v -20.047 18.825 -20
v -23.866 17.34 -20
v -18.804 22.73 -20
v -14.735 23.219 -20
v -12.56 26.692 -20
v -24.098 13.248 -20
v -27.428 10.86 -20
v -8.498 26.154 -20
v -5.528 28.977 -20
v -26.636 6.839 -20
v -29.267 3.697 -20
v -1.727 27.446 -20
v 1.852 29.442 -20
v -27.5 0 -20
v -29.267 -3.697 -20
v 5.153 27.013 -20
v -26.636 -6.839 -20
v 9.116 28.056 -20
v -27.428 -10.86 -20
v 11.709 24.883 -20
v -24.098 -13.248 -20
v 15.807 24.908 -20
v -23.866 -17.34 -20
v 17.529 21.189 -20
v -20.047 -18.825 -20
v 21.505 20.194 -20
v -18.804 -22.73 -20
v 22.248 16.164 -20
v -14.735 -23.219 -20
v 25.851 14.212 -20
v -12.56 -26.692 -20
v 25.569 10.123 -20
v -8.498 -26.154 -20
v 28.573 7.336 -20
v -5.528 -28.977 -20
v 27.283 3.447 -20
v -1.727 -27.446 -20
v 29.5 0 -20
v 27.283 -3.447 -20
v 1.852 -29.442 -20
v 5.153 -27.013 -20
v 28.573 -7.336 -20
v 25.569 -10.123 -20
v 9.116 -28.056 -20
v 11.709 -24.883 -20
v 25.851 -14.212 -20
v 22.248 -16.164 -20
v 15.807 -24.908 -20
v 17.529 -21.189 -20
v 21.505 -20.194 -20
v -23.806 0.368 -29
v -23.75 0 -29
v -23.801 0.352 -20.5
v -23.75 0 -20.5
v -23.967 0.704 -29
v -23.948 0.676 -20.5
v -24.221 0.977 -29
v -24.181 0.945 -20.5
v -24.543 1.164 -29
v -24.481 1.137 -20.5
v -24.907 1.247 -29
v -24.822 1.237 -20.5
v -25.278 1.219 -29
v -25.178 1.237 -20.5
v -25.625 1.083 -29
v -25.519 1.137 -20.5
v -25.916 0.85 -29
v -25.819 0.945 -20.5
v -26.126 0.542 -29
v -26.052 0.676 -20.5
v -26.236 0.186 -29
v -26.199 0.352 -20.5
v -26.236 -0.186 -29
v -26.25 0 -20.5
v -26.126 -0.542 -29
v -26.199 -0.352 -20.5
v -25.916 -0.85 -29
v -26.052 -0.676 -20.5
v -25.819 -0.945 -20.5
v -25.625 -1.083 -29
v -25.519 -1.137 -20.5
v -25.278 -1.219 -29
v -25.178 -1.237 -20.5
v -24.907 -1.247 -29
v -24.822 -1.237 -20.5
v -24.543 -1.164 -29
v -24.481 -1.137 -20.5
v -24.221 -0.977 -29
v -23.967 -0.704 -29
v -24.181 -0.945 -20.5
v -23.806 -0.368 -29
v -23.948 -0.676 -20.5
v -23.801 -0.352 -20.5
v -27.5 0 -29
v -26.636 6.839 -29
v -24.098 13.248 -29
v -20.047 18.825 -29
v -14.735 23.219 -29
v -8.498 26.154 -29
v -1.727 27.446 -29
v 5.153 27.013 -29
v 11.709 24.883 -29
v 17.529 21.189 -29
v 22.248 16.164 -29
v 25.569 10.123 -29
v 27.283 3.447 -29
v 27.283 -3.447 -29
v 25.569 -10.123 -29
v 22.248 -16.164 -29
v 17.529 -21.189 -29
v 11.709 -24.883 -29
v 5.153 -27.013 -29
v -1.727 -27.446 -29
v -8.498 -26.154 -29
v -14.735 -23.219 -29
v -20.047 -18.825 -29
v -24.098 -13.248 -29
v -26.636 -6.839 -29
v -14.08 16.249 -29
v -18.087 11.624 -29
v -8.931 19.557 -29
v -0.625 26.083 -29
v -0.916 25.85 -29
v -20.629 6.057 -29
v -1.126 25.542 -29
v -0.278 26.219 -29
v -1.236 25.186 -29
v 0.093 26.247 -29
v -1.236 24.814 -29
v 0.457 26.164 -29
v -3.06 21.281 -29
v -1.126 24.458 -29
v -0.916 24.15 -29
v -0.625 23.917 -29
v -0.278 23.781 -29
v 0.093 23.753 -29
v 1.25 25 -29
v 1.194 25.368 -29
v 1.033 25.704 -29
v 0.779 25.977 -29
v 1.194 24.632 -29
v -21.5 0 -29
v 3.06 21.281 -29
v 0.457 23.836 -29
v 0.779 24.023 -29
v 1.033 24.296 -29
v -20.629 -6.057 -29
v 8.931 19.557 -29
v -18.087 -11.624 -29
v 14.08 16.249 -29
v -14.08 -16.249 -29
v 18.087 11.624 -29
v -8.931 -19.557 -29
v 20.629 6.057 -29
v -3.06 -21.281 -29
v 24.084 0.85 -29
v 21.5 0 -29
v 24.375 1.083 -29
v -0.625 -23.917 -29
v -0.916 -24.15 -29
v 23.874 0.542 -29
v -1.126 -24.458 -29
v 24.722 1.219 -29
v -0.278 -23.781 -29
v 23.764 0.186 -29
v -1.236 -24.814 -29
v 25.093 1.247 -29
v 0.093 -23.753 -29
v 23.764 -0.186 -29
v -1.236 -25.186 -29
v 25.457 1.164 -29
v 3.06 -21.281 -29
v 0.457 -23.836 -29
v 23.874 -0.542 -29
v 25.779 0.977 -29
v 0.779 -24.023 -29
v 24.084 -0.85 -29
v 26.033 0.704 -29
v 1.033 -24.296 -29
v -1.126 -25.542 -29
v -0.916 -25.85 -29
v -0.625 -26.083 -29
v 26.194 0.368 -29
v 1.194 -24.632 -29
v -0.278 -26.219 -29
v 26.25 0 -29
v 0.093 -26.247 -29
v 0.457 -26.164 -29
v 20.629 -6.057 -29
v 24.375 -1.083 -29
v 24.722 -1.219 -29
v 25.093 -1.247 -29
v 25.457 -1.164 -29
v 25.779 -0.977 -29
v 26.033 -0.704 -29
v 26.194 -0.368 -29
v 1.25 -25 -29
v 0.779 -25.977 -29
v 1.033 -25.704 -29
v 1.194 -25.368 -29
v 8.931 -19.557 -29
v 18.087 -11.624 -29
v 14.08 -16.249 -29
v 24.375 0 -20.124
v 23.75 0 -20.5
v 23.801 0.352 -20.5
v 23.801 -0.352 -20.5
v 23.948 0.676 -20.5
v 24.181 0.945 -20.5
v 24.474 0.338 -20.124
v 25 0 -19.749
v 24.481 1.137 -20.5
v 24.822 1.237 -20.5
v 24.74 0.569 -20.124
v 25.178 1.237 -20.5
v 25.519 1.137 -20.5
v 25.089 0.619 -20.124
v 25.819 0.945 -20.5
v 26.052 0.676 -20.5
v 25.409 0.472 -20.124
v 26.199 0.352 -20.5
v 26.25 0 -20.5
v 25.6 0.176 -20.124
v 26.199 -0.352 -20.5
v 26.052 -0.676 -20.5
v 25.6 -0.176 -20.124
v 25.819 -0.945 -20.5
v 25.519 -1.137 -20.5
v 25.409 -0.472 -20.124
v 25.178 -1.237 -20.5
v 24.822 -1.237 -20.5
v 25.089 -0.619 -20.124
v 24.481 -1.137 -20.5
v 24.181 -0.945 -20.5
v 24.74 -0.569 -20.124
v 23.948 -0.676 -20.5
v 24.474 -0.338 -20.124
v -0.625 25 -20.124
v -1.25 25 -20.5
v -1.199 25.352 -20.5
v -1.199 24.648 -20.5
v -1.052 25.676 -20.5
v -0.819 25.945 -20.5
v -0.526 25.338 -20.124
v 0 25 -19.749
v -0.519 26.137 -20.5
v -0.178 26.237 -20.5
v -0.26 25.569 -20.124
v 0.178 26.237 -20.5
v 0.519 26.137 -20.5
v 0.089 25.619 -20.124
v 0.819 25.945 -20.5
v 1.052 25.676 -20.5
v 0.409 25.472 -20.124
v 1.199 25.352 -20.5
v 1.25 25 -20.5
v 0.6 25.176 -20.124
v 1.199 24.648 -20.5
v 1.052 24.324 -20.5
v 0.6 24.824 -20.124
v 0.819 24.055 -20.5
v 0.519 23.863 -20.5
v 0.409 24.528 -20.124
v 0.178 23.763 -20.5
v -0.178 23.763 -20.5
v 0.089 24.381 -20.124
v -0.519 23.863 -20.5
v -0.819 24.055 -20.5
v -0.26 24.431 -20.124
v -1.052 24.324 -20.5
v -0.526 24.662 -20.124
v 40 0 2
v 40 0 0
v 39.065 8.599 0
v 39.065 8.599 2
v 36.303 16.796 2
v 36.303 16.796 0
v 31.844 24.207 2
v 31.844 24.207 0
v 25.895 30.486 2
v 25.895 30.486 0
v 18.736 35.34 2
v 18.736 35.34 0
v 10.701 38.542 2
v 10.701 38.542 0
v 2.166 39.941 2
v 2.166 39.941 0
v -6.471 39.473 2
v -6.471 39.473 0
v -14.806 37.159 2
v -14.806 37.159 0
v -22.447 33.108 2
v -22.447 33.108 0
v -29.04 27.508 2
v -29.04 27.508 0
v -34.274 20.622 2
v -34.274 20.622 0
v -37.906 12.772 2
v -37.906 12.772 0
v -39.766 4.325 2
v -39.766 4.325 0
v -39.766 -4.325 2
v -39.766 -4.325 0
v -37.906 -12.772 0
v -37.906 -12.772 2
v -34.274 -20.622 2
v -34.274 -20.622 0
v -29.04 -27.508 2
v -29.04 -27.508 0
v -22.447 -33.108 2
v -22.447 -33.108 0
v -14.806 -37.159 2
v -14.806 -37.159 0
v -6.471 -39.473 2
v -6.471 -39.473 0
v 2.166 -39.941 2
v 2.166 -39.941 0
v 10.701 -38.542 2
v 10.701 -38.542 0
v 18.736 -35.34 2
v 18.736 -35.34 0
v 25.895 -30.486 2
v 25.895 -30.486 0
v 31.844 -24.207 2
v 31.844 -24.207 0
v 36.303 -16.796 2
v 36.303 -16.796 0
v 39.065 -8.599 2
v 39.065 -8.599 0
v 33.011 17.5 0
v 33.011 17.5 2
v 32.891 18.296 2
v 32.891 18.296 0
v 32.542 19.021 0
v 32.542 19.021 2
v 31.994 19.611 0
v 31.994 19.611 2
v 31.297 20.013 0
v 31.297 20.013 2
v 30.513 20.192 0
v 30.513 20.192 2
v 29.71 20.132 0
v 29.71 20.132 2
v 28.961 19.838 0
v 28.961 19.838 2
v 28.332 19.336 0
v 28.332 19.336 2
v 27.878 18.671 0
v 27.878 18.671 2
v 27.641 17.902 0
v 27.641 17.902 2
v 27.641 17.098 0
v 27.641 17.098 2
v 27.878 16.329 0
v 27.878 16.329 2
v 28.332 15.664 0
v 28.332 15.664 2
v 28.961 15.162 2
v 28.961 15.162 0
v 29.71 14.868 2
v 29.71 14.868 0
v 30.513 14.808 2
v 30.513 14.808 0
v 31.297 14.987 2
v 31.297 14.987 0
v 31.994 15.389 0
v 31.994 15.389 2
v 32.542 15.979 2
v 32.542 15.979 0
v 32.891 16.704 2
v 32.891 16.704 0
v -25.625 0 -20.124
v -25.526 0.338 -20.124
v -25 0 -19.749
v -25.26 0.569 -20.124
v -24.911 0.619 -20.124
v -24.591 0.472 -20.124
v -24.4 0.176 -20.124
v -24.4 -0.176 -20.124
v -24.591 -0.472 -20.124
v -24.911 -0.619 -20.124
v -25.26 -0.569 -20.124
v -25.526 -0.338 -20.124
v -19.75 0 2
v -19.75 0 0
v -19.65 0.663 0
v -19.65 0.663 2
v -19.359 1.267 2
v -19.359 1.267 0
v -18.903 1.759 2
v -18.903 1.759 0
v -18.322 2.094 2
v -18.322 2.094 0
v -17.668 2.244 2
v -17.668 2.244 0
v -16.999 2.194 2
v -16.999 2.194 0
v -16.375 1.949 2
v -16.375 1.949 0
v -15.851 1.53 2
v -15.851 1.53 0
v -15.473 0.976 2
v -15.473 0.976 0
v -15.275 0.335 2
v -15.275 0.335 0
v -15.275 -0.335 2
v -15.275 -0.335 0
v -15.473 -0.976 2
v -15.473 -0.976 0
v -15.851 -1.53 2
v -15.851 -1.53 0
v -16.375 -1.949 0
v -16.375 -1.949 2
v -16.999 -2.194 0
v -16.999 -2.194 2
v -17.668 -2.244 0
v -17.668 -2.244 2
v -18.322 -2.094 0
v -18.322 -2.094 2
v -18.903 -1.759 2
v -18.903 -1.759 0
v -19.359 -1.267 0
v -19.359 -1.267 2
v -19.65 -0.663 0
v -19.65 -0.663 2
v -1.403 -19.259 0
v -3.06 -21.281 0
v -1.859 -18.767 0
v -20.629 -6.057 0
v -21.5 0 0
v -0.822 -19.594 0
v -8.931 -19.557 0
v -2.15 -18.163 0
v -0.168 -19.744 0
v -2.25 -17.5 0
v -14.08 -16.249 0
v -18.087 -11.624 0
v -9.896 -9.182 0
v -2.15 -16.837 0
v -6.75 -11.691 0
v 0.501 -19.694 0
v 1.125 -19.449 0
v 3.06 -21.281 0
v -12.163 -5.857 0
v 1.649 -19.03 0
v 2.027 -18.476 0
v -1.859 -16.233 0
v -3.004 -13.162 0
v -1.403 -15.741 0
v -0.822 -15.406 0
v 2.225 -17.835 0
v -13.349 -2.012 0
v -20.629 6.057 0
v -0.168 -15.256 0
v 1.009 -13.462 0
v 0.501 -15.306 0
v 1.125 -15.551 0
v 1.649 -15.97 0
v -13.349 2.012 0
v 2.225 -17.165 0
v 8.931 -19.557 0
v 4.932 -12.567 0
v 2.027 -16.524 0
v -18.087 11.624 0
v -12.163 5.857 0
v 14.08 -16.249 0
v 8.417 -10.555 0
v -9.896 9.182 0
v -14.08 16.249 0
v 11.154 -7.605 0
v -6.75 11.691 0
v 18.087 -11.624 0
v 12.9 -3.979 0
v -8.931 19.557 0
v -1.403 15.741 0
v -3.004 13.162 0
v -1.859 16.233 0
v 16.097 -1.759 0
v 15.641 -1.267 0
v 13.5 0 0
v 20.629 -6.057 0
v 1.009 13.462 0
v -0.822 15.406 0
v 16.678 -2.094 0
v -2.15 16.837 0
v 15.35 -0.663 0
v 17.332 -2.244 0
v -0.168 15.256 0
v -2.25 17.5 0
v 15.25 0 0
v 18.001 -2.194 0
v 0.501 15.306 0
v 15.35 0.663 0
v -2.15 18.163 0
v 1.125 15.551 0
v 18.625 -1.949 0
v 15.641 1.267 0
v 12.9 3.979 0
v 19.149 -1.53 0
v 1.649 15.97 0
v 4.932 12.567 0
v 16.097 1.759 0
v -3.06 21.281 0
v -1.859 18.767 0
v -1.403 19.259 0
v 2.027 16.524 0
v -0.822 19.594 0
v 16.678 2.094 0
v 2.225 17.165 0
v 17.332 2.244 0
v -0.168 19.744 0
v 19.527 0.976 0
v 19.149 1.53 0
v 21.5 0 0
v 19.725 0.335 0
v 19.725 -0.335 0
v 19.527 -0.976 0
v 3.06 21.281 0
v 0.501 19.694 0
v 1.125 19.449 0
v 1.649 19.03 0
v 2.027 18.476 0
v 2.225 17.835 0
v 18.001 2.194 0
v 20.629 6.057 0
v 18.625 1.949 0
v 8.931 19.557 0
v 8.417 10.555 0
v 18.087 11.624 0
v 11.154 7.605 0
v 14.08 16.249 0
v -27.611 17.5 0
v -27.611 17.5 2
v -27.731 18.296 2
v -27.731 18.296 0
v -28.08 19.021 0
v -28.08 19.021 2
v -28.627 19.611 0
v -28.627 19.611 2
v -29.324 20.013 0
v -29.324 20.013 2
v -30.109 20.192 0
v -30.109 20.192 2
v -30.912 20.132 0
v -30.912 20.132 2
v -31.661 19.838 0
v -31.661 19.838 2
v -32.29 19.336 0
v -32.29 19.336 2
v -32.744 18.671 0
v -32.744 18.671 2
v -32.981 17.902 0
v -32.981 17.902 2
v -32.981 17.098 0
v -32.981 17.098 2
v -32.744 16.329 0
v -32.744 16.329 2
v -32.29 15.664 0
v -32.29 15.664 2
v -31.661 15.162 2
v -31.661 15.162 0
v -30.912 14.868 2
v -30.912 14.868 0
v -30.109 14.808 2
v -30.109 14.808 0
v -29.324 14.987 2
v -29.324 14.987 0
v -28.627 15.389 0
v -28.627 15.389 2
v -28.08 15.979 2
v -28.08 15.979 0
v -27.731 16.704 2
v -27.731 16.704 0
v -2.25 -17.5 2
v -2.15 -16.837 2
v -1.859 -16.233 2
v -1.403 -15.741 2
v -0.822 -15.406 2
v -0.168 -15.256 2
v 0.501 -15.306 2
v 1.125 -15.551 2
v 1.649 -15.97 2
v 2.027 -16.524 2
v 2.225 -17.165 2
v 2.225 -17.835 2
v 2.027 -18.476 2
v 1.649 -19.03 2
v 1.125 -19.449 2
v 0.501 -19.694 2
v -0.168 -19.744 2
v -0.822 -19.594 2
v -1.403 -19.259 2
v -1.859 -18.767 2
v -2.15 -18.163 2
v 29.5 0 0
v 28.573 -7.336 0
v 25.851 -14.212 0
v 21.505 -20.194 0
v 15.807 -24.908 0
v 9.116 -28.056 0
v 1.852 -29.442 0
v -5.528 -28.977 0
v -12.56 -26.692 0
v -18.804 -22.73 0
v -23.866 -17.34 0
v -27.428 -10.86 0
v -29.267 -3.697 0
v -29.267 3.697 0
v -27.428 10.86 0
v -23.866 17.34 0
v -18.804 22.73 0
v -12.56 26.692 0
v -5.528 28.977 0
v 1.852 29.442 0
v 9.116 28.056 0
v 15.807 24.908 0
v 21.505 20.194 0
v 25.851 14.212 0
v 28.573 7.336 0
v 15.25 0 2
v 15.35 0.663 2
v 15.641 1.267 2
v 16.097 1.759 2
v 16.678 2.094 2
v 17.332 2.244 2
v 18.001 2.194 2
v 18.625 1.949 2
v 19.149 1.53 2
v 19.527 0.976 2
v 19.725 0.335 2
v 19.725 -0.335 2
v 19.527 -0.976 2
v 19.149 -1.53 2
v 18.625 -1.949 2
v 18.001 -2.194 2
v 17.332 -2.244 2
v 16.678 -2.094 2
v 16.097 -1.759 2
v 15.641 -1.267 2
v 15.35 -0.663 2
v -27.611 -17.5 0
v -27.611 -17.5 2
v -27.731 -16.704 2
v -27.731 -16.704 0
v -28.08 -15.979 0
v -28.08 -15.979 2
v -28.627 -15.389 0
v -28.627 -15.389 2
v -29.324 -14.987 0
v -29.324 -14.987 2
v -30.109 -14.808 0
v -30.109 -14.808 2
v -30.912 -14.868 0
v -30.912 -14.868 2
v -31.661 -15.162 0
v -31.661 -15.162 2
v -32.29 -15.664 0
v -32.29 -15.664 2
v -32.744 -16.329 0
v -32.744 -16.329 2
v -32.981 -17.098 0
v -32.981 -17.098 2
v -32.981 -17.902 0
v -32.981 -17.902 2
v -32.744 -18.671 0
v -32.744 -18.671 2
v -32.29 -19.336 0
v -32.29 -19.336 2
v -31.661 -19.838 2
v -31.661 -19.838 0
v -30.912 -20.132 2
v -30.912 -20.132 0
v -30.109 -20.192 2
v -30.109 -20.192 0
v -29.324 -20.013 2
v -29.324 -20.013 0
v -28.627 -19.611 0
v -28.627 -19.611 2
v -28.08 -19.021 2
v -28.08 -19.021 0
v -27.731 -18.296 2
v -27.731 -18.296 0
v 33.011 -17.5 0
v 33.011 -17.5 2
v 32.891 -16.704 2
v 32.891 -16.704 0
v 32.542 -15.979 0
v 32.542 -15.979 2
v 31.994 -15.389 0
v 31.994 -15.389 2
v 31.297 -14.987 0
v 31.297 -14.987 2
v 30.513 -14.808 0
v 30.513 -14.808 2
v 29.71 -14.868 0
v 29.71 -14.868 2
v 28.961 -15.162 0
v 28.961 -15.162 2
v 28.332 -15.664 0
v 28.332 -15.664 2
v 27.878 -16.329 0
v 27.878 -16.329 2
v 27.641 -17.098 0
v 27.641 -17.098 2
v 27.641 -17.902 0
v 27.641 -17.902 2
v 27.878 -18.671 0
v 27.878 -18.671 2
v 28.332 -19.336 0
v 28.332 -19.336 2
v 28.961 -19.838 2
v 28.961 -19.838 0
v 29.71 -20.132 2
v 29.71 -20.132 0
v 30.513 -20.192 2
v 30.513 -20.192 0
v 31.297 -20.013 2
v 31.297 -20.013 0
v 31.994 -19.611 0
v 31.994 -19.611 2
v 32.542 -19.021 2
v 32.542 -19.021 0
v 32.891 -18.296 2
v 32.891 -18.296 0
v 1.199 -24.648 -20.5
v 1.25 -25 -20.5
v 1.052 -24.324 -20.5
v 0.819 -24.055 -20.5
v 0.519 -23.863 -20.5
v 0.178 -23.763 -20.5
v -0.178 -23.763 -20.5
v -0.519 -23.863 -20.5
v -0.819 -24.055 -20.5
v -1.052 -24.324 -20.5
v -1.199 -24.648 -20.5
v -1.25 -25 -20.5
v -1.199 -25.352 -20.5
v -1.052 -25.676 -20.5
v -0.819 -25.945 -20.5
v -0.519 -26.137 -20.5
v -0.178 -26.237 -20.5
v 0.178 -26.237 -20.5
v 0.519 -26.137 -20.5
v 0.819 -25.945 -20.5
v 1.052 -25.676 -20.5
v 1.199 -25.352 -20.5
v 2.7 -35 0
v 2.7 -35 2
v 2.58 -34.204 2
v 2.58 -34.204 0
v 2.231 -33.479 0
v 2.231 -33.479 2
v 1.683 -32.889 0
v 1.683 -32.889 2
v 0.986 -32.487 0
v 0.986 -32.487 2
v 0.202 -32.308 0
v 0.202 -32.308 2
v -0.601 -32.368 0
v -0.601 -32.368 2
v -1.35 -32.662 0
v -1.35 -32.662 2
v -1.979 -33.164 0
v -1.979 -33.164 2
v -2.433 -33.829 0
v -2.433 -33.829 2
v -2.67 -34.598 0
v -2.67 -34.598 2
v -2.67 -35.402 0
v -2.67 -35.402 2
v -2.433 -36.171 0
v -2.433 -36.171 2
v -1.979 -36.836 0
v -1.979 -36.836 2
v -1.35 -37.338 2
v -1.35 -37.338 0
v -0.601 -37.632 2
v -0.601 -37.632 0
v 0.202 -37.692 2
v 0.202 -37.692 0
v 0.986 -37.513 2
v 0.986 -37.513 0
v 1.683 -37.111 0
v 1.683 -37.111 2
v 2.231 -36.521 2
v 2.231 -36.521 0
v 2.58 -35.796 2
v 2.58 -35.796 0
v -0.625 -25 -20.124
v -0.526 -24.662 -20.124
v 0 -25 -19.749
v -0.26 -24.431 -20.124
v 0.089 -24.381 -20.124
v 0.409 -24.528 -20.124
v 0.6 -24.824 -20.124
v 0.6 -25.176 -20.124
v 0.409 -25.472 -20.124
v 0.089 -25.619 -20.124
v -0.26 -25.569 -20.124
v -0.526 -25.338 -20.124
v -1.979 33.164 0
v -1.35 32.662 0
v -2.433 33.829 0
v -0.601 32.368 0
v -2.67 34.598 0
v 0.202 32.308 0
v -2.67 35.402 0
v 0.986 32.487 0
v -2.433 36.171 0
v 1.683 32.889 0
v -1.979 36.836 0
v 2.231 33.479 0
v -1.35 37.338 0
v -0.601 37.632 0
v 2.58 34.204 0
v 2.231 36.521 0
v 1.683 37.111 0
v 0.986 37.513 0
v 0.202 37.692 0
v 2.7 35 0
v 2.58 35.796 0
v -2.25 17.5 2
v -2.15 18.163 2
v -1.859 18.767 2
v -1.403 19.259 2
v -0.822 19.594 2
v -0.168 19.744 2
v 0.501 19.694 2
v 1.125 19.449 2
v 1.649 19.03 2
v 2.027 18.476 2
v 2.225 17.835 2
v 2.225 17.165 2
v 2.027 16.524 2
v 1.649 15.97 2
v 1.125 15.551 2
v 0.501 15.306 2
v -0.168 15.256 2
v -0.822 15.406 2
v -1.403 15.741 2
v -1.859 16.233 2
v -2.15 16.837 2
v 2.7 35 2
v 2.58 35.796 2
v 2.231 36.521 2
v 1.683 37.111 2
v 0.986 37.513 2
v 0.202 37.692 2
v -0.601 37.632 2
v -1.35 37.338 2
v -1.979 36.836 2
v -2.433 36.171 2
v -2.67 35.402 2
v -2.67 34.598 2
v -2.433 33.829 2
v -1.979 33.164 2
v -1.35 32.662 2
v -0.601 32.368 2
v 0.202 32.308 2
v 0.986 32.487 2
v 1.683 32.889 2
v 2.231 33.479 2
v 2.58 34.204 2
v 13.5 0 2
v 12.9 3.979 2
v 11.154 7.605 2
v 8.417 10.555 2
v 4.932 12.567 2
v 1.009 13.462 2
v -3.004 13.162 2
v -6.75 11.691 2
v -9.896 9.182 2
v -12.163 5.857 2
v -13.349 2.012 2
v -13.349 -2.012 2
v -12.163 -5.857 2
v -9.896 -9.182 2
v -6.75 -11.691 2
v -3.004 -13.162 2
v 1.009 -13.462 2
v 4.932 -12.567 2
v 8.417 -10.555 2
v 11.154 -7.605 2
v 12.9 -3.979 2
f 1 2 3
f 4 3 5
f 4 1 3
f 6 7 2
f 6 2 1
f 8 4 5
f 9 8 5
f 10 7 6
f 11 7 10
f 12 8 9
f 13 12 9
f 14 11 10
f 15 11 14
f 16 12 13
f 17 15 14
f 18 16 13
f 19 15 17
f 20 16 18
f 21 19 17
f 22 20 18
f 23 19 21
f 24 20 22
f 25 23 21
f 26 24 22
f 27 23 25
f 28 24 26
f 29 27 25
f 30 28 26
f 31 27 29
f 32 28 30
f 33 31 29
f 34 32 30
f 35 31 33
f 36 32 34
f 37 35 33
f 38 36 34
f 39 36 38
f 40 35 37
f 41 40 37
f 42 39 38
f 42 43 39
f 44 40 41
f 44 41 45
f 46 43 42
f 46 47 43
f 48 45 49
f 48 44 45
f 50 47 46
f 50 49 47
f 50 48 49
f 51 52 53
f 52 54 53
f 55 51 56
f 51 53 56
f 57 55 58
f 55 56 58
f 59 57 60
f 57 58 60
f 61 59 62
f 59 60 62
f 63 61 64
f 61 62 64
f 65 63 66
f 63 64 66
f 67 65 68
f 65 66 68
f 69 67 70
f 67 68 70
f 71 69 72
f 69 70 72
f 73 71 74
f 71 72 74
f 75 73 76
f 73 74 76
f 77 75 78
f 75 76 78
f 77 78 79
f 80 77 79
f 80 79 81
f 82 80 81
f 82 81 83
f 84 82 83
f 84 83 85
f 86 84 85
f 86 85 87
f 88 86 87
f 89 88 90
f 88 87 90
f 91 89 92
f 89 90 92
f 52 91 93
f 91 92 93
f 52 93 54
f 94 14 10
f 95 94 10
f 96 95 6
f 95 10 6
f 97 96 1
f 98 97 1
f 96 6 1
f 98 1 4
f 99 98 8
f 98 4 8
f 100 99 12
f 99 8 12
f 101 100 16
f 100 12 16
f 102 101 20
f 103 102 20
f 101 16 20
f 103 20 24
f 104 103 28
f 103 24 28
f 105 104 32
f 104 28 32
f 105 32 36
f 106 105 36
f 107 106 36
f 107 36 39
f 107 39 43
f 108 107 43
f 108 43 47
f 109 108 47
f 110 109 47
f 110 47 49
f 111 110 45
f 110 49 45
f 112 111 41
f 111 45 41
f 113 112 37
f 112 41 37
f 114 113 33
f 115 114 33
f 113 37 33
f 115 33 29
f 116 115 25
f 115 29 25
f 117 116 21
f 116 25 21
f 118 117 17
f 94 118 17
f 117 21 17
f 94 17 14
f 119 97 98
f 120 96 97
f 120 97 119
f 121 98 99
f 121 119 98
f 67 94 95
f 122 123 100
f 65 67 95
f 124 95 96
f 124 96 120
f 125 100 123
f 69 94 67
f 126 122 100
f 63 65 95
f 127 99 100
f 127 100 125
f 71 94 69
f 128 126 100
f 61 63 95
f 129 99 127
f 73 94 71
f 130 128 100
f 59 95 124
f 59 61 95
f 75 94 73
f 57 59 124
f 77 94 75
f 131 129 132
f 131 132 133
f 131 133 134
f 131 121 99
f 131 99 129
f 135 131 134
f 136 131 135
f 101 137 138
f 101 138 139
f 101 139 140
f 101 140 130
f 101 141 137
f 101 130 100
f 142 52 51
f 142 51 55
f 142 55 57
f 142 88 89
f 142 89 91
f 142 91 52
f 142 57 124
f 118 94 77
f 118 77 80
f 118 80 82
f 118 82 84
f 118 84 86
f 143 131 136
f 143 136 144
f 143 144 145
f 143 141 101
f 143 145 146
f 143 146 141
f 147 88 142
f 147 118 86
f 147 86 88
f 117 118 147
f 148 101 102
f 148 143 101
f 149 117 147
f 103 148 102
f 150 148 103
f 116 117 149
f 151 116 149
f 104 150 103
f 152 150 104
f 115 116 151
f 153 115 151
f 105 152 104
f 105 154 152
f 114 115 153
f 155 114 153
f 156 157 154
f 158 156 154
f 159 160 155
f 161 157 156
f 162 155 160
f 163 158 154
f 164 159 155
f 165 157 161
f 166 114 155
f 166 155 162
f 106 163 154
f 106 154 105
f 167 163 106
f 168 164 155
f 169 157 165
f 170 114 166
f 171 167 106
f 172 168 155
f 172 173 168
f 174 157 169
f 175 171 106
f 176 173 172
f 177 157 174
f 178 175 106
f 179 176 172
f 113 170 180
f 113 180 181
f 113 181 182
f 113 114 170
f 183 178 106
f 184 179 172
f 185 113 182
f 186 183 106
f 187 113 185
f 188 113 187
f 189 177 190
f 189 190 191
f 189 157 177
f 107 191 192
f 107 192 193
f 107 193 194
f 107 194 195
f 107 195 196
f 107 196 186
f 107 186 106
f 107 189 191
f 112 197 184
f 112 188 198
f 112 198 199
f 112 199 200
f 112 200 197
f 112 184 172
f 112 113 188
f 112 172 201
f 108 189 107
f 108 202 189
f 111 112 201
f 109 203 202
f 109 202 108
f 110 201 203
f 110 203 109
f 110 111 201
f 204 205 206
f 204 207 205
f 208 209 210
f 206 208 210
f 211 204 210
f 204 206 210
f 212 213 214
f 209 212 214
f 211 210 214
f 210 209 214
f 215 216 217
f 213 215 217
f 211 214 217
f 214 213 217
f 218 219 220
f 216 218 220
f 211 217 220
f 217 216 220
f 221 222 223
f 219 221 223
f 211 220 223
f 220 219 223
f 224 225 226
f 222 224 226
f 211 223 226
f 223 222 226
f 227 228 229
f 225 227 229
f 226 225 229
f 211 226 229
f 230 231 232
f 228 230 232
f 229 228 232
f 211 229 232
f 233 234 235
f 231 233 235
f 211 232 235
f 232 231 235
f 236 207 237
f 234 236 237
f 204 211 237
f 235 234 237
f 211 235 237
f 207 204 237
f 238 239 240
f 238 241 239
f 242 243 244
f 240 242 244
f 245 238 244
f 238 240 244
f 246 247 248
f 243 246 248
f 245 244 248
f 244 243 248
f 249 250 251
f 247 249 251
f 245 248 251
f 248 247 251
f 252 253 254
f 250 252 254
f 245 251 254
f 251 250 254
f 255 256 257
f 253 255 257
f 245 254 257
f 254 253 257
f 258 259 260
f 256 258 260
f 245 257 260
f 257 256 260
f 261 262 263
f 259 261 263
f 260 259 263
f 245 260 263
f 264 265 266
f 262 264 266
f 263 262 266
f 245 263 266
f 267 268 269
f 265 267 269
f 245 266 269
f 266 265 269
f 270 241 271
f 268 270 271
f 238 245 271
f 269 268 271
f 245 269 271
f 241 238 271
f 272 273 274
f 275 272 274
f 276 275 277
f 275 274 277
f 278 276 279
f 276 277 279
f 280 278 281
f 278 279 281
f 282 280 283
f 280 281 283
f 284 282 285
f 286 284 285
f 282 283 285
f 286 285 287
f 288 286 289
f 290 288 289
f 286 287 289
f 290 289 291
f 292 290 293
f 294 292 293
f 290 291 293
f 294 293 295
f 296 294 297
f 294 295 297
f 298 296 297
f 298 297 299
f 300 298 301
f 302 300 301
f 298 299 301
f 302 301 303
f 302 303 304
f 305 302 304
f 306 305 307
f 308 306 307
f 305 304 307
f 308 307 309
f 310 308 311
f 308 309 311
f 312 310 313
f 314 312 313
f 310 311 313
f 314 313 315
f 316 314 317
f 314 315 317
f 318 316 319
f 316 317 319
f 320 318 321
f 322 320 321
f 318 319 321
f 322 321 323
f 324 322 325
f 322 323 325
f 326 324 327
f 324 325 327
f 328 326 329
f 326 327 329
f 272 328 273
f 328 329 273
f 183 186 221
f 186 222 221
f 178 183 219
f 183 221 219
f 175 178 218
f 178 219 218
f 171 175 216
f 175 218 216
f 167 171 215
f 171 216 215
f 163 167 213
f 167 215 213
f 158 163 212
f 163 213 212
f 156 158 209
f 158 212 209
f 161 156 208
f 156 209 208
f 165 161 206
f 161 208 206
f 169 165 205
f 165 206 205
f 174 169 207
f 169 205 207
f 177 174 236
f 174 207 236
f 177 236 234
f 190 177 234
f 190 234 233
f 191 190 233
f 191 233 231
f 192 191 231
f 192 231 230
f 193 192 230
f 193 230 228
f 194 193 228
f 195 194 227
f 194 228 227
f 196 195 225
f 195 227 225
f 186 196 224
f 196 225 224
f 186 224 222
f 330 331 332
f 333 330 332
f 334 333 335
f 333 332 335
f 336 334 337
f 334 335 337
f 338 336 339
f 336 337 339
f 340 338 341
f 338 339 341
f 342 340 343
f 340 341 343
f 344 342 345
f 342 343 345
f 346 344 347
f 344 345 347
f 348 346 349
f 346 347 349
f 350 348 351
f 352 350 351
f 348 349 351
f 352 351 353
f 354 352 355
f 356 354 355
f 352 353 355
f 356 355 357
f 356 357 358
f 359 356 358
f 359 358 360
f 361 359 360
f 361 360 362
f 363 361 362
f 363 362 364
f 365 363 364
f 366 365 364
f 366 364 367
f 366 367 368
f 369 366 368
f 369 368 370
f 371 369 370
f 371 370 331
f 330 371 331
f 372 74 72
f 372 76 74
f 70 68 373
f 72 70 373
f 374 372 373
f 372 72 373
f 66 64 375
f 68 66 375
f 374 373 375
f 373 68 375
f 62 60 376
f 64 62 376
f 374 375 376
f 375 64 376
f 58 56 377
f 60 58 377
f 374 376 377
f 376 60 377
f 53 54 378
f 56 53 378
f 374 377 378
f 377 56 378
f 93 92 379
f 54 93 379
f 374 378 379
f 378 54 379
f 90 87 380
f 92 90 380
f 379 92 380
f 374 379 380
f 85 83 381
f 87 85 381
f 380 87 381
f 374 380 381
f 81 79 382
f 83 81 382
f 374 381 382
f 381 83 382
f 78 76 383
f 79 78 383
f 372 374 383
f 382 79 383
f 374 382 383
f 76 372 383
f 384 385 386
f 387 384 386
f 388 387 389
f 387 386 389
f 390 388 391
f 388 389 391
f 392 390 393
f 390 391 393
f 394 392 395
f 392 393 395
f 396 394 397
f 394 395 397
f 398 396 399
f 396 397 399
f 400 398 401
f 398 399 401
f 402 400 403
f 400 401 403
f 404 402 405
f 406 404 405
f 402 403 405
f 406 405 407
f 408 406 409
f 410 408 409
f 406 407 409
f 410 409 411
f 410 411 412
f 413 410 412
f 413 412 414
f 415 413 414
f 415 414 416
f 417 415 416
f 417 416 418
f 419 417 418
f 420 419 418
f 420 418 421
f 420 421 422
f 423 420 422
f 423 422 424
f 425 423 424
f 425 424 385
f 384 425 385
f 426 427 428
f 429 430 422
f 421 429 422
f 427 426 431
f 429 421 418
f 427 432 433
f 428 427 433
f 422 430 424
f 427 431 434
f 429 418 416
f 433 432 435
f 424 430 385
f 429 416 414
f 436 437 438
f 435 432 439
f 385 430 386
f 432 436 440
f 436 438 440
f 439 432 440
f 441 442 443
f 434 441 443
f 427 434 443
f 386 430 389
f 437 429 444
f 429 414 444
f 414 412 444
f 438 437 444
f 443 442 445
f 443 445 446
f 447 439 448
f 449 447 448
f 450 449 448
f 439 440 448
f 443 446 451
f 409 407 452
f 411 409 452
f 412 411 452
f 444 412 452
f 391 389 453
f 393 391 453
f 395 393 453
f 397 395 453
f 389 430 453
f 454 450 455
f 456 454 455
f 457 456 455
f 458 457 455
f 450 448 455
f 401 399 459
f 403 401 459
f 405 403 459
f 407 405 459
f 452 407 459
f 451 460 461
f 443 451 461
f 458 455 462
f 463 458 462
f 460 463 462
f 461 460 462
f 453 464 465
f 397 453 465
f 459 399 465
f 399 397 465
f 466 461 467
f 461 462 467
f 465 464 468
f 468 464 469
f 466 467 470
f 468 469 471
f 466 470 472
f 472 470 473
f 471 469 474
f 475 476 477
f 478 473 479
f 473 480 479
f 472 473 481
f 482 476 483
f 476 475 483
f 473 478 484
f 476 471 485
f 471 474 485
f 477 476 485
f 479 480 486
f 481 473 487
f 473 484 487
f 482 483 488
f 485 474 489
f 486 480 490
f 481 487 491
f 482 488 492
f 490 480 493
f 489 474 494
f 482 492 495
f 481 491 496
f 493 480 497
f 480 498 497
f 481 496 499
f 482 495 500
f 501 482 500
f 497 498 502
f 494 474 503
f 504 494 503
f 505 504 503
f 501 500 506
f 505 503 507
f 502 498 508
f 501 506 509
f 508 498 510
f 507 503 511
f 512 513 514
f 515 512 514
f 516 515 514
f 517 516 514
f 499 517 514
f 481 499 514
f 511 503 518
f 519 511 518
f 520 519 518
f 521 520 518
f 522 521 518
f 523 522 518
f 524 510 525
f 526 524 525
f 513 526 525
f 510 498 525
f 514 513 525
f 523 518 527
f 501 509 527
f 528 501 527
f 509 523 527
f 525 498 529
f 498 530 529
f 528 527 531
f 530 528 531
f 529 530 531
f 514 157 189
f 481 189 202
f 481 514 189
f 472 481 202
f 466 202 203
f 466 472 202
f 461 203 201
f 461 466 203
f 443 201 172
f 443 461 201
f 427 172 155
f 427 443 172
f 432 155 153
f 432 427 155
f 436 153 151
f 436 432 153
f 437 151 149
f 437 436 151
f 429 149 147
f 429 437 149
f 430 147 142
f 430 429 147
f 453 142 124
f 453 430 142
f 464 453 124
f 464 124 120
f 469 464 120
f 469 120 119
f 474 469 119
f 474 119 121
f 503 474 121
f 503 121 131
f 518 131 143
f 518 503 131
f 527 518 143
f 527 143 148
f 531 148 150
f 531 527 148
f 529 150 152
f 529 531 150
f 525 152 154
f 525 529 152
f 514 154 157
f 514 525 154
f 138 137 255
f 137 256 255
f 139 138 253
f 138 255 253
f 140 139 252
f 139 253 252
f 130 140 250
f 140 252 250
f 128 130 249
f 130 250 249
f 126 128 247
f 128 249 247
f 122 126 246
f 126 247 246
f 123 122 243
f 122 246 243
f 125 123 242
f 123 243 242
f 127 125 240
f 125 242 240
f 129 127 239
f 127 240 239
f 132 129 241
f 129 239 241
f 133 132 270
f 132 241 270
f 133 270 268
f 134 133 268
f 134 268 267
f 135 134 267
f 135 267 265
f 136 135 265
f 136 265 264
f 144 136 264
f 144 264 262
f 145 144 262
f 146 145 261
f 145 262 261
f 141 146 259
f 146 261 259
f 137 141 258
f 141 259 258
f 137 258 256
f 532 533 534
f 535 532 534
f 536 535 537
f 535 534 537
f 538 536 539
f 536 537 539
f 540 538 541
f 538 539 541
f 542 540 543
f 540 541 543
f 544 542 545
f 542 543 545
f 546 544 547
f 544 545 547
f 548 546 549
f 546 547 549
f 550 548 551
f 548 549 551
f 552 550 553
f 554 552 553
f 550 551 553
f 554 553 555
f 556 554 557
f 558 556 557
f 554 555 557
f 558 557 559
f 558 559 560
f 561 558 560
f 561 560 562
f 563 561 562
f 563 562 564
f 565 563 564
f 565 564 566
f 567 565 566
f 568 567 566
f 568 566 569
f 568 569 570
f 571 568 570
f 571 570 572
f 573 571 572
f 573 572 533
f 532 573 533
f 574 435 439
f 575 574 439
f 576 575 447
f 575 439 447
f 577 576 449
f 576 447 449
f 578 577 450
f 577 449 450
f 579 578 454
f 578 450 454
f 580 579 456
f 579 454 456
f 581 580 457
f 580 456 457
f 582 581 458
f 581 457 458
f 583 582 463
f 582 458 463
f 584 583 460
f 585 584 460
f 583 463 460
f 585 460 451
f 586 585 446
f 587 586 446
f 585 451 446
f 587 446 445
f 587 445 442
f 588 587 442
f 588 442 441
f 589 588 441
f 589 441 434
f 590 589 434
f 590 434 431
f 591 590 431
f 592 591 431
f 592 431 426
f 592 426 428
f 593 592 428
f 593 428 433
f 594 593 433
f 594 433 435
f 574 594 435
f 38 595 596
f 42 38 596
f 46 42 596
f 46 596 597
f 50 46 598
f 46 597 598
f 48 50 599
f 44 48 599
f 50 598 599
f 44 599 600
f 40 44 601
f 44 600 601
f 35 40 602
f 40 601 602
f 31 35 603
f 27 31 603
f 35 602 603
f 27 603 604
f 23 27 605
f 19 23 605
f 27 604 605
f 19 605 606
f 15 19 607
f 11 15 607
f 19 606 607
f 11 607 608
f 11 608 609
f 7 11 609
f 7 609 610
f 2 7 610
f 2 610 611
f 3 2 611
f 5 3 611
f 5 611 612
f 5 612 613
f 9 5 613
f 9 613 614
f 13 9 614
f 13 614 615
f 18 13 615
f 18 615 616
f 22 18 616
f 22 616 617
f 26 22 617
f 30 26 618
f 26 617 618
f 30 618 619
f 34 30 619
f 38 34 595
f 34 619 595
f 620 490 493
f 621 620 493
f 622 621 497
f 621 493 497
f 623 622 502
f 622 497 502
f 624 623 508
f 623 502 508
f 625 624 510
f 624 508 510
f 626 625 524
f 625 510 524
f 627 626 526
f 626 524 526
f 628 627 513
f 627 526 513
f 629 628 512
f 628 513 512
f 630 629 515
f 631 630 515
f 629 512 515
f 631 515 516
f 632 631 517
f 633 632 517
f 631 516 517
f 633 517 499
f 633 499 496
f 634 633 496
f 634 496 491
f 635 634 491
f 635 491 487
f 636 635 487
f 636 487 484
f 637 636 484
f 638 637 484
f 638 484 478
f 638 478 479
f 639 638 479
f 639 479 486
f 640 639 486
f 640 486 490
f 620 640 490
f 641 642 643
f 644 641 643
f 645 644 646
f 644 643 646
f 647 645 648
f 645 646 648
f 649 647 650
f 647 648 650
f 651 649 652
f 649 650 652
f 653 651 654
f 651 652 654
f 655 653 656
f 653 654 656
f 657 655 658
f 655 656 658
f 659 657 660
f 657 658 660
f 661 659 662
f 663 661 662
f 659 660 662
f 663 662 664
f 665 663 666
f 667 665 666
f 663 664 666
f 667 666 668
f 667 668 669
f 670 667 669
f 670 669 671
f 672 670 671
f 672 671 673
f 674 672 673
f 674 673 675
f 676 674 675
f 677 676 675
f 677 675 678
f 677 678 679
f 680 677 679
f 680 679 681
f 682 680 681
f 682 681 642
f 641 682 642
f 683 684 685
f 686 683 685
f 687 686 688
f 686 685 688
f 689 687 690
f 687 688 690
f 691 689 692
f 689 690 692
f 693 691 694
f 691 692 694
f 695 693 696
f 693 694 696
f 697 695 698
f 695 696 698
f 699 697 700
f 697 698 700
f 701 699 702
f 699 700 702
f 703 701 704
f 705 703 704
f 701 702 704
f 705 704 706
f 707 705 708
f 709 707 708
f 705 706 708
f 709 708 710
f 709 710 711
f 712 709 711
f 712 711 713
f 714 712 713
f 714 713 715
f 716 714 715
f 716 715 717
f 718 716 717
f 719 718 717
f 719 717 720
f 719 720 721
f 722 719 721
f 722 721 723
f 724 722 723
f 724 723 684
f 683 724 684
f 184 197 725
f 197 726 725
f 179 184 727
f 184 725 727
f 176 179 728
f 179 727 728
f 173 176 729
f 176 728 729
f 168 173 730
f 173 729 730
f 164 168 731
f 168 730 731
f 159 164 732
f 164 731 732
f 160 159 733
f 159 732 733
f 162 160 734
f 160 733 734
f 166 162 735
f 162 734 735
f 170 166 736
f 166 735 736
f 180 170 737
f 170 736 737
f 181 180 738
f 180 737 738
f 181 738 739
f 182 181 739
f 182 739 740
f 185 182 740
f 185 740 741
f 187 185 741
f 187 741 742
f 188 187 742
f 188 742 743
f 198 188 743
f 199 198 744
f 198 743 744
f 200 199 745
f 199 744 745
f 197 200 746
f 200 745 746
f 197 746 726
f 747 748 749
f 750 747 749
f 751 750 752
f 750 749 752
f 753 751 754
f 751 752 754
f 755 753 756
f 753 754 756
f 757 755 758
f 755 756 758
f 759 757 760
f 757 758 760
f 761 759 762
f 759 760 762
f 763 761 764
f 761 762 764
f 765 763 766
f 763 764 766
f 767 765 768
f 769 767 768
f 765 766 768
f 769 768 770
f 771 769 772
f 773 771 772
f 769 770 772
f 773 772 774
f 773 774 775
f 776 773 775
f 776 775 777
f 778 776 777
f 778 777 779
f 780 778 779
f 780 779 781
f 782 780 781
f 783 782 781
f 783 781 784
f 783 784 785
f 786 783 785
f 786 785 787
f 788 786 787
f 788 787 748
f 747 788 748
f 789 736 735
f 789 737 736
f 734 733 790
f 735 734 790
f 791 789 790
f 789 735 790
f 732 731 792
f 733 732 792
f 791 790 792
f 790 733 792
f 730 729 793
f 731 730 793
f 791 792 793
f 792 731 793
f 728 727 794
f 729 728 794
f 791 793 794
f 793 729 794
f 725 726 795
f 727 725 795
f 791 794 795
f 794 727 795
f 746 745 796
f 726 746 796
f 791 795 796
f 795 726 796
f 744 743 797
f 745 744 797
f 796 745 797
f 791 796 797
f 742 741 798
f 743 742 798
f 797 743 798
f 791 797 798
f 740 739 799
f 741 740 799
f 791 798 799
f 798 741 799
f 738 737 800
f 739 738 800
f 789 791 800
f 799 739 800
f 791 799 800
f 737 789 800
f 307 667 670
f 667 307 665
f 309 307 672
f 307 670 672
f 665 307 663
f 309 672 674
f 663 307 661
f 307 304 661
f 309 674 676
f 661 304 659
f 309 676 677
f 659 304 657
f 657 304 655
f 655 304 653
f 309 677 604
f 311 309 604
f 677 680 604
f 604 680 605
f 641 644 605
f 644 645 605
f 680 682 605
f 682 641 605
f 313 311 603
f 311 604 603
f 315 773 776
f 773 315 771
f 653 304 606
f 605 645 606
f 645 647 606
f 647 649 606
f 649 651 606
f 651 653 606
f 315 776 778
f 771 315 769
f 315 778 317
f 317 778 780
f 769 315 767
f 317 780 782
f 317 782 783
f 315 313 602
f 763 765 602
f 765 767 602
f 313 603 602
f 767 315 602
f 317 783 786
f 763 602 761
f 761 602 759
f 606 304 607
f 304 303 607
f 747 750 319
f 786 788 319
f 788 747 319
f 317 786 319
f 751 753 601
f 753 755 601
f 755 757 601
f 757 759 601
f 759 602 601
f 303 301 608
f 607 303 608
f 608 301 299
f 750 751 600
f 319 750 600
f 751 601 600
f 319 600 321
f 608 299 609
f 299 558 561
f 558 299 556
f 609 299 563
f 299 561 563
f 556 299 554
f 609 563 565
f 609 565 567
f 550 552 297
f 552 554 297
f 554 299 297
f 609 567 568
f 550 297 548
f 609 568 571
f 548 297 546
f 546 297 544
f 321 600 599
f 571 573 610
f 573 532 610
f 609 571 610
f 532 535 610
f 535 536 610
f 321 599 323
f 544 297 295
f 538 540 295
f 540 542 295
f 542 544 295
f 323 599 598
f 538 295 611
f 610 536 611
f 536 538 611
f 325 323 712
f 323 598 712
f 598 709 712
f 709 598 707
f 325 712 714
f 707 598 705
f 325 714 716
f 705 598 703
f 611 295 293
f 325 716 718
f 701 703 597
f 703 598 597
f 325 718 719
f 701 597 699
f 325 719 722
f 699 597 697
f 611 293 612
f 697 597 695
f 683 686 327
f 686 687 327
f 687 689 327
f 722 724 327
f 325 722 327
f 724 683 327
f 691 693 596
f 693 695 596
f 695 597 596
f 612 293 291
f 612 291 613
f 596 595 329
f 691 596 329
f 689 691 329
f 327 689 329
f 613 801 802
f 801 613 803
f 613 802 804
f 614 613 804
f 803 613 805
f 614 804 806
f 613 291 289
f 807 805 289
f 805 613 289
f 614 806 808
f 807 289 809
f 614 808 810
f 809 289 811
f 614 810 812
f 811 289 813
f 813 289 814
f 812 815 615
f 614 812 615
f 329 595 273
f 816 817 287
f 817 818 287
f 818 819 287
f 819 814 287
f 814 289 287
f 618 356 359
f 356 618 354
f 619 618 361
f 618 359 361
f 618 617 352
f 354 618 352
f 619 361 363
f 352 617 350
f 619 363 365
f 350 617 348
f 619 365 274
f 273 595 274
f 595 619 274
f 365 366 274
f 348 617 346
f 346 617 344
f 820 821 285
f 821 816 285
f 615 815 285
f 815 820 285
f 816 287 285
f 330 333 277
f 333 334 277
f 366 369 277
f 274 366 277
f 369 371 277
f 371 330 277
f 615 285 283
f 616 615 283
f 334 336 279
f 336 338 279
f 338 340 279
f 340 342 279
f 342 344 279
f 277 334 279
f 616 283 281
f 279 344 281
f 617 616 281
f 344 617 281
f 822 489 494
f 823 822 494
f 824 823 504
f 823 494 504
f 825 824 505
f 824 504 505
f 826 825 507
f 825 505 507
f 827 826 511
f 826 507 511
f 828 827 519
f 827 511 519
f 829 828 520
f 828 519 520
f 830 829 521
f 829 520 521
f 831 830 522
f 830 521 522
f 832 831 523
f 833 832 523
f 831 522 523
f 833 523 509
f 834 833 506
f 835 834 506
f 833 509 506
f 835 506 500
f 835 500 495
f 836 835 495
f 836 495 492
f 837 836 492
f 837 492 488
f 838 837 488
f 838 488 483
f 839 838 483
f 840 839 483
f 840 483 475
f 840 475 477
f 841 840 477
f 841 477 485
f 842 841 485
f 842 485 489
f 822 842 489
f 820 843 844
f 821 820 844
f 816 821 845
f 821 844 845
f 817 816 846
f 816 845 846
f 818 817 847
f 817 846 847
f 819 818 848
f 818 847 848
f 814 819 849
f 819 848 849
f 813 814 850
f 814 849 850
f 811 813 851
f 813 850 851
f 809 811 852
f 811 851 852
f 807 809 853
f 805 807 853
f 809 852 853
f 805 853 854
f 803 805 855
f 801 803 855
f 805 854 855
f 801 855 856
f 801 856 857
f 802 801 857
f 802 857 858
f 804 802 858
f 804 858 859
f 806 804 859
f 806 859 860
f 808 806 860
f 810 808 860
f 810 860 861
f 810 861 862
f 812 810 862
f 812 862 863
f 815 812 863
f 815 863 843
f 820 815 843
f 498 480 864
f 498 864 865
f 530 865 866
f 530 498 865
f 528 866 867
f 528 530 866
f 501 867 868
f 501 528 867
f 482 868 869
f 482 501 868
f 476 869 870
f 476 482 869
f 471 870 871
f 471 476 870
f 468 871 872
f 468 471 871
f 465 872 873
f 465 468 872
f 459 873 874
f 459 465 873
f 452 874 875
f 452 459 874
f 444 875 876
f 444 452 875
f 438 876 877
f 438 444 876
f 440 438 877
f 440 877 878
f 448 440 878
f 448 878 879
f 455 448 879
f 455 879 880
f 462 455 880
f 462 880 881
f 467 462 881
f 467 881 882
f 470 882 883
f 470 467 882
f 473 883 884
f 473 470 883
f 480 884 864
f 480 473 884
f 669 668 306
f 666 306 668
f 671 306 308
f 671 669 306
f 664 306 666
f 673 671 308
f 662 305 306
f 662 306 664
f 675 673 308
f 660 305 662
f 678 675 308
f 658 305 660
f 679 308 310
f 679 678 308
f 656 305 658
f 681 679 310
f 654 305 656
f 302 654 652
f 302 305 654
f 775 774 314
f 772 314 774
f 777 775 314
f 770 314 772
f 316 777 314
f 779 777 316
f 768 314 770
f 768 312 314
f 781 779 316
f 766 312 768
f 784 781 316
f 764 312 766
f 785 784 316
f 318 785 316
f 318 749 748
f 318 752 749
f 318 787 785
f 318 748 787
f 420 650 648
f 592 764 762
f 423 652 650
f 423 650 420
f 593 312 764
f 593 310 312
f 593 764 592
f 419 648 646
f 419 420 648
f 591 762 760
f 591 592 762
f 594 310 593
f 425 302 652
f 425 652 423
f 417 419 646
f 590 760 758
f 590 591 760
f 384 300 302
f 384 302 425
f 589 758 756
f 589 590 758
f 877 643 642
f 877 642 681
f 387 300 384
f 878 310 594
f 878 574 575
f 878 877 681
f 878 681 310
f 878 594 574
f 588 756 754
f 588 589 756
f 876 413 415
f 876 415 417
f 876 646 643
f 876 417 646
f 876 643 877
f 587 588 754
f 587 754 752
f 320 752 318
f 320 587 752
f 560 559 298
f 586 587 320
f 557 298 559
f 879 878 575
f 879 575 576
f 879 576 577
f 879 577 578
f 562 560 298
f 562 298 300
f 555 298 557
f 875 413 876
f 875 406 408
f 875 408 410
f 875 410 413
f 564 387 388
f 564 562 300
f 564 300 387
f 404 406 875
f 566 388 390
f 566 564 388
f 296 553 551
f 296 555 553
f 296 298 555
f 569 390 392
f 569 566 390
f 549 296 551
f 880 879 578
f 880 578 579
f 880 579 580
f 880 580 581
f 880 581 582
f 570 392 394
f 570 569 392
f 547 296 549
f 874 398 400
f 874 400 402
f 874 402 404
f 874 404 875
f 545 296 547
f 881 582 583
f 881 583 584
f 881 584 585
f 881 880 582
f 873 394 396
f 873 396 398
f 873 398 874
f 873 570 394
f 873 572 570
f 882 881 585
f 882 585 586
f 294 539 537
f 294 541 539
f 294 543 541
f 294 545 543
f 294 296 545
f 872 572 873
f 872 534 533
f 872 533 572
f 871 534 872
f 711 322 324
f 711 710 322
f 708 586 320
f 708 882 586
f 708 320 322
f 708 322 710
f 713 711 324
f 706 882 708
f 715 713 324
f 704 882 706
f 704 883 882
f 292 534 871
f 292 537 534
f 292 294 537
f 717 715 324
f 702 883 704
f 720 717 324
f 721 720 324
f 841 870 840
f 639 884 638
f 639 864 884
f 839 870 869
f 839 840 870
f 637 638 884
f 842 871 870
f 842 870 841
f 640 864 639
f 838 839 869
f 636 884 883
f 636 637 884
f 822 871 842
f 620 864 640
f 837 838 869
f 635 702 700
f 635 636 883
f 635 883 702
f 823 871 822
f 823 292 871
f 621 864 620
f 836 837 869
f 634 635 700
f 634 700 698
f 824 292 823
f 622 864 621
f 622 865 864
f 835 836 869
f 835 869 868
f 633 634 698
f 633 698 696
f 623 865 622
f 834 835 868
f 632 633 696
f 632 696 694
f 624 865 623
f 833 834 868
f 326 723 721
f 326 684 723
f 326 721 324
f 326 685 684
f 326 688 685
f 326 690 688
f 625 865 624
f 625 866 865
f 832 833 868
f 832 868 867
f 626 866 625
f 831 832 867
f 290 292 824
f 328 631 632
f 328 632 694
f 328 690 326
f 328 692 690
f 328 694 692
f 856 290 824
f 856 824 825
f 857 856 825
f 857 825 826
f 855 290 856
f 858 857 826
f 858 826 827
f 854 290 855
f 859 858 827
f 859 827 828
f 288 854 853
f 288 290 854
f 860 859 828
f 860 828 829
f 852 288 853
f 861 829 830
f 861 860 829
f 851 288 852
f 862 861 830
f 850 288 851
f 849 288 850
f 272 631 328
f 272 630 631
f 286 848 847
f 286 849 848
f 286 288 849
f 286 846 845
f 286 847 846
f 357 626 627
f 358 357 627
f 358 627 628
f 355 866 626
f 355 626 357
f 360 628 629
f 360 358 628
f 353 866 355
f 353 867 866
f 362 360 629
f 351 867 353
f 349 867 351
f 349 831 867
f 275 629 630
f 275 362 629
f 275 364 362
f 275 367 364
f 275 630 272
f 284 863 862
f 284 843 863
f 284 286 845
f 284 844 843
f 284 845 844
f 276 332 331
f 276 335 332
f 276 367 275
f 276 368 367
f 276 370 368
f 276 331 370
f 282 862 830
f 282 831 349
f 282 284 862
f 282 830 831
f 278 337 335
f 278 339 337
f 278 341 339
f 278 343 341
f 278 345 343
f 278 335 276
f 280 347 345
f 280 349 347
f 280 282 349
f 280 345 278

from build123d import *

# Parameters (mm, degrees)
SKETCH_1_R              = 40
SKETCH_1_R_2            = 13.5
EXTRUDE_1_DEPTH         = 2
HOLE_WIZARD_M4_1_D      = 4.5
HOLE_WIZARD_5_4_5_4_1_D = 5.4
SKETCH_8_R              = 29.5
SKETCH_8_R_2            = 21.5
EXTRUDE_2_DEPTH         = 29
CUT_EXTRUDE_START       = -9
SKETCH_10_R             = 29.5
SKETCH_10_R_2           = 27.5
CUT_EXTRUDE_2_DEPTH     = 9
HOLE_WIZARD_M3_1_D      = 2.5
HOLE_WIZARD_M3_1_DEPTH  = 8.5
HOLE_WIZARD_M3_1_TIP    = 0.751075774


with BuildPart() as part:
    # 草图1 → 凸台-拉伸1 (new body)
    with BuildSketch(Plane.XY):
        Circle(SKETCH_1_R)
        Circle(SKETCH_1_R_2, mode=Mode.SUBTRACT)
    extrude(amount=EXTRUDE_1_DEPTH)

    # M4 间隙孔1 (through all)
    with Locations(Plane(origin=(-17.5, 0, 2), x_dir=(1, 0, 0), z_dir=(0, 0, 1))):
        with Locations((0, 0), (17.5, 17.5), (35, 0), (17.5, -17.5)):
            Hole(HOLE_WIZARD_M4_1_D / 2)

    # Ø5.4 (5.4) 直径孔1 (through all)
    with Locations(Plane(origin=(0, 0, 0), x_dir=(-1, 0, 0), z_dir=(0, 0, -1))):
        with Locations((-30.310889132, 17.5), (0, 35), (30.310889132, 17.5), (30.310889132, -17.5), (0, -35), (-30.310889132, -17.5)):
            Hole(HOLE_WIZARD_5_4_5_4_1_D / 2)

    # 草图8 → 凸台-拉伸2 (add)
    with BuildSketch(Plane(origin=(0, 0, 0), x_dir=(-1, 0, 0), z_dir=(0, 0, -1))):
        with Locations(Location((0, 0, 0), (0, 0, 180))):
            Circle(SKETCH_8_R)
        with Locations(Location((0, 0, 0), (0, 0, 180))):
            Circle(SKETCH_8_R_2, mode=Mode.SUBTRACT)
    extrude(amount=EXTRUDE_2_DEPTH)

    # 草图10 → 切除-拉伸2 (cut)
    with BuildSketch(Plane(origin=(0, 0, -29), x_dir=(-1, 0, 0), z_dir=(0, 0, -1)).offset(CUT_EXTRUDE_START)):
        with Locations(Location((0, 0, 0), (0, 0, 180))):
            Circle(SKETCH_10_R)
        Circle(SKETCH_10_R_2, mode=Mode.SUBTRACT)
    extrude(amount=CUT_EXTRUDE_2_DEPTH, mode=Mode.SUBTRACT)

    # M3 螺纹孔1
    with Locations(Plane(origin=(25, 0, -29), x_dir=(-1, 0, 0), z_dir=(0, 0, -1))):
        with Locations((0, 0), (25, 25), (50, 0), (25, -25)):
            Hole(HOLE_WIZARD_M3_1_D / 2, depth=HOLE_WIZARD_M3_1_DEPTH)
            with Locations((0, 0, -(HOLE_WIZARD_M3_1_DEPTH + HOLE_WIZARD_M3_1_TIP / 2))):  # 118° drill point
                Cone(0, HOLE_WIZARD_M3_1_D / 2, HOLE_WIZARD_M3_1_TIP, mode=Mode.SUBTRACT)


solid = part.part
